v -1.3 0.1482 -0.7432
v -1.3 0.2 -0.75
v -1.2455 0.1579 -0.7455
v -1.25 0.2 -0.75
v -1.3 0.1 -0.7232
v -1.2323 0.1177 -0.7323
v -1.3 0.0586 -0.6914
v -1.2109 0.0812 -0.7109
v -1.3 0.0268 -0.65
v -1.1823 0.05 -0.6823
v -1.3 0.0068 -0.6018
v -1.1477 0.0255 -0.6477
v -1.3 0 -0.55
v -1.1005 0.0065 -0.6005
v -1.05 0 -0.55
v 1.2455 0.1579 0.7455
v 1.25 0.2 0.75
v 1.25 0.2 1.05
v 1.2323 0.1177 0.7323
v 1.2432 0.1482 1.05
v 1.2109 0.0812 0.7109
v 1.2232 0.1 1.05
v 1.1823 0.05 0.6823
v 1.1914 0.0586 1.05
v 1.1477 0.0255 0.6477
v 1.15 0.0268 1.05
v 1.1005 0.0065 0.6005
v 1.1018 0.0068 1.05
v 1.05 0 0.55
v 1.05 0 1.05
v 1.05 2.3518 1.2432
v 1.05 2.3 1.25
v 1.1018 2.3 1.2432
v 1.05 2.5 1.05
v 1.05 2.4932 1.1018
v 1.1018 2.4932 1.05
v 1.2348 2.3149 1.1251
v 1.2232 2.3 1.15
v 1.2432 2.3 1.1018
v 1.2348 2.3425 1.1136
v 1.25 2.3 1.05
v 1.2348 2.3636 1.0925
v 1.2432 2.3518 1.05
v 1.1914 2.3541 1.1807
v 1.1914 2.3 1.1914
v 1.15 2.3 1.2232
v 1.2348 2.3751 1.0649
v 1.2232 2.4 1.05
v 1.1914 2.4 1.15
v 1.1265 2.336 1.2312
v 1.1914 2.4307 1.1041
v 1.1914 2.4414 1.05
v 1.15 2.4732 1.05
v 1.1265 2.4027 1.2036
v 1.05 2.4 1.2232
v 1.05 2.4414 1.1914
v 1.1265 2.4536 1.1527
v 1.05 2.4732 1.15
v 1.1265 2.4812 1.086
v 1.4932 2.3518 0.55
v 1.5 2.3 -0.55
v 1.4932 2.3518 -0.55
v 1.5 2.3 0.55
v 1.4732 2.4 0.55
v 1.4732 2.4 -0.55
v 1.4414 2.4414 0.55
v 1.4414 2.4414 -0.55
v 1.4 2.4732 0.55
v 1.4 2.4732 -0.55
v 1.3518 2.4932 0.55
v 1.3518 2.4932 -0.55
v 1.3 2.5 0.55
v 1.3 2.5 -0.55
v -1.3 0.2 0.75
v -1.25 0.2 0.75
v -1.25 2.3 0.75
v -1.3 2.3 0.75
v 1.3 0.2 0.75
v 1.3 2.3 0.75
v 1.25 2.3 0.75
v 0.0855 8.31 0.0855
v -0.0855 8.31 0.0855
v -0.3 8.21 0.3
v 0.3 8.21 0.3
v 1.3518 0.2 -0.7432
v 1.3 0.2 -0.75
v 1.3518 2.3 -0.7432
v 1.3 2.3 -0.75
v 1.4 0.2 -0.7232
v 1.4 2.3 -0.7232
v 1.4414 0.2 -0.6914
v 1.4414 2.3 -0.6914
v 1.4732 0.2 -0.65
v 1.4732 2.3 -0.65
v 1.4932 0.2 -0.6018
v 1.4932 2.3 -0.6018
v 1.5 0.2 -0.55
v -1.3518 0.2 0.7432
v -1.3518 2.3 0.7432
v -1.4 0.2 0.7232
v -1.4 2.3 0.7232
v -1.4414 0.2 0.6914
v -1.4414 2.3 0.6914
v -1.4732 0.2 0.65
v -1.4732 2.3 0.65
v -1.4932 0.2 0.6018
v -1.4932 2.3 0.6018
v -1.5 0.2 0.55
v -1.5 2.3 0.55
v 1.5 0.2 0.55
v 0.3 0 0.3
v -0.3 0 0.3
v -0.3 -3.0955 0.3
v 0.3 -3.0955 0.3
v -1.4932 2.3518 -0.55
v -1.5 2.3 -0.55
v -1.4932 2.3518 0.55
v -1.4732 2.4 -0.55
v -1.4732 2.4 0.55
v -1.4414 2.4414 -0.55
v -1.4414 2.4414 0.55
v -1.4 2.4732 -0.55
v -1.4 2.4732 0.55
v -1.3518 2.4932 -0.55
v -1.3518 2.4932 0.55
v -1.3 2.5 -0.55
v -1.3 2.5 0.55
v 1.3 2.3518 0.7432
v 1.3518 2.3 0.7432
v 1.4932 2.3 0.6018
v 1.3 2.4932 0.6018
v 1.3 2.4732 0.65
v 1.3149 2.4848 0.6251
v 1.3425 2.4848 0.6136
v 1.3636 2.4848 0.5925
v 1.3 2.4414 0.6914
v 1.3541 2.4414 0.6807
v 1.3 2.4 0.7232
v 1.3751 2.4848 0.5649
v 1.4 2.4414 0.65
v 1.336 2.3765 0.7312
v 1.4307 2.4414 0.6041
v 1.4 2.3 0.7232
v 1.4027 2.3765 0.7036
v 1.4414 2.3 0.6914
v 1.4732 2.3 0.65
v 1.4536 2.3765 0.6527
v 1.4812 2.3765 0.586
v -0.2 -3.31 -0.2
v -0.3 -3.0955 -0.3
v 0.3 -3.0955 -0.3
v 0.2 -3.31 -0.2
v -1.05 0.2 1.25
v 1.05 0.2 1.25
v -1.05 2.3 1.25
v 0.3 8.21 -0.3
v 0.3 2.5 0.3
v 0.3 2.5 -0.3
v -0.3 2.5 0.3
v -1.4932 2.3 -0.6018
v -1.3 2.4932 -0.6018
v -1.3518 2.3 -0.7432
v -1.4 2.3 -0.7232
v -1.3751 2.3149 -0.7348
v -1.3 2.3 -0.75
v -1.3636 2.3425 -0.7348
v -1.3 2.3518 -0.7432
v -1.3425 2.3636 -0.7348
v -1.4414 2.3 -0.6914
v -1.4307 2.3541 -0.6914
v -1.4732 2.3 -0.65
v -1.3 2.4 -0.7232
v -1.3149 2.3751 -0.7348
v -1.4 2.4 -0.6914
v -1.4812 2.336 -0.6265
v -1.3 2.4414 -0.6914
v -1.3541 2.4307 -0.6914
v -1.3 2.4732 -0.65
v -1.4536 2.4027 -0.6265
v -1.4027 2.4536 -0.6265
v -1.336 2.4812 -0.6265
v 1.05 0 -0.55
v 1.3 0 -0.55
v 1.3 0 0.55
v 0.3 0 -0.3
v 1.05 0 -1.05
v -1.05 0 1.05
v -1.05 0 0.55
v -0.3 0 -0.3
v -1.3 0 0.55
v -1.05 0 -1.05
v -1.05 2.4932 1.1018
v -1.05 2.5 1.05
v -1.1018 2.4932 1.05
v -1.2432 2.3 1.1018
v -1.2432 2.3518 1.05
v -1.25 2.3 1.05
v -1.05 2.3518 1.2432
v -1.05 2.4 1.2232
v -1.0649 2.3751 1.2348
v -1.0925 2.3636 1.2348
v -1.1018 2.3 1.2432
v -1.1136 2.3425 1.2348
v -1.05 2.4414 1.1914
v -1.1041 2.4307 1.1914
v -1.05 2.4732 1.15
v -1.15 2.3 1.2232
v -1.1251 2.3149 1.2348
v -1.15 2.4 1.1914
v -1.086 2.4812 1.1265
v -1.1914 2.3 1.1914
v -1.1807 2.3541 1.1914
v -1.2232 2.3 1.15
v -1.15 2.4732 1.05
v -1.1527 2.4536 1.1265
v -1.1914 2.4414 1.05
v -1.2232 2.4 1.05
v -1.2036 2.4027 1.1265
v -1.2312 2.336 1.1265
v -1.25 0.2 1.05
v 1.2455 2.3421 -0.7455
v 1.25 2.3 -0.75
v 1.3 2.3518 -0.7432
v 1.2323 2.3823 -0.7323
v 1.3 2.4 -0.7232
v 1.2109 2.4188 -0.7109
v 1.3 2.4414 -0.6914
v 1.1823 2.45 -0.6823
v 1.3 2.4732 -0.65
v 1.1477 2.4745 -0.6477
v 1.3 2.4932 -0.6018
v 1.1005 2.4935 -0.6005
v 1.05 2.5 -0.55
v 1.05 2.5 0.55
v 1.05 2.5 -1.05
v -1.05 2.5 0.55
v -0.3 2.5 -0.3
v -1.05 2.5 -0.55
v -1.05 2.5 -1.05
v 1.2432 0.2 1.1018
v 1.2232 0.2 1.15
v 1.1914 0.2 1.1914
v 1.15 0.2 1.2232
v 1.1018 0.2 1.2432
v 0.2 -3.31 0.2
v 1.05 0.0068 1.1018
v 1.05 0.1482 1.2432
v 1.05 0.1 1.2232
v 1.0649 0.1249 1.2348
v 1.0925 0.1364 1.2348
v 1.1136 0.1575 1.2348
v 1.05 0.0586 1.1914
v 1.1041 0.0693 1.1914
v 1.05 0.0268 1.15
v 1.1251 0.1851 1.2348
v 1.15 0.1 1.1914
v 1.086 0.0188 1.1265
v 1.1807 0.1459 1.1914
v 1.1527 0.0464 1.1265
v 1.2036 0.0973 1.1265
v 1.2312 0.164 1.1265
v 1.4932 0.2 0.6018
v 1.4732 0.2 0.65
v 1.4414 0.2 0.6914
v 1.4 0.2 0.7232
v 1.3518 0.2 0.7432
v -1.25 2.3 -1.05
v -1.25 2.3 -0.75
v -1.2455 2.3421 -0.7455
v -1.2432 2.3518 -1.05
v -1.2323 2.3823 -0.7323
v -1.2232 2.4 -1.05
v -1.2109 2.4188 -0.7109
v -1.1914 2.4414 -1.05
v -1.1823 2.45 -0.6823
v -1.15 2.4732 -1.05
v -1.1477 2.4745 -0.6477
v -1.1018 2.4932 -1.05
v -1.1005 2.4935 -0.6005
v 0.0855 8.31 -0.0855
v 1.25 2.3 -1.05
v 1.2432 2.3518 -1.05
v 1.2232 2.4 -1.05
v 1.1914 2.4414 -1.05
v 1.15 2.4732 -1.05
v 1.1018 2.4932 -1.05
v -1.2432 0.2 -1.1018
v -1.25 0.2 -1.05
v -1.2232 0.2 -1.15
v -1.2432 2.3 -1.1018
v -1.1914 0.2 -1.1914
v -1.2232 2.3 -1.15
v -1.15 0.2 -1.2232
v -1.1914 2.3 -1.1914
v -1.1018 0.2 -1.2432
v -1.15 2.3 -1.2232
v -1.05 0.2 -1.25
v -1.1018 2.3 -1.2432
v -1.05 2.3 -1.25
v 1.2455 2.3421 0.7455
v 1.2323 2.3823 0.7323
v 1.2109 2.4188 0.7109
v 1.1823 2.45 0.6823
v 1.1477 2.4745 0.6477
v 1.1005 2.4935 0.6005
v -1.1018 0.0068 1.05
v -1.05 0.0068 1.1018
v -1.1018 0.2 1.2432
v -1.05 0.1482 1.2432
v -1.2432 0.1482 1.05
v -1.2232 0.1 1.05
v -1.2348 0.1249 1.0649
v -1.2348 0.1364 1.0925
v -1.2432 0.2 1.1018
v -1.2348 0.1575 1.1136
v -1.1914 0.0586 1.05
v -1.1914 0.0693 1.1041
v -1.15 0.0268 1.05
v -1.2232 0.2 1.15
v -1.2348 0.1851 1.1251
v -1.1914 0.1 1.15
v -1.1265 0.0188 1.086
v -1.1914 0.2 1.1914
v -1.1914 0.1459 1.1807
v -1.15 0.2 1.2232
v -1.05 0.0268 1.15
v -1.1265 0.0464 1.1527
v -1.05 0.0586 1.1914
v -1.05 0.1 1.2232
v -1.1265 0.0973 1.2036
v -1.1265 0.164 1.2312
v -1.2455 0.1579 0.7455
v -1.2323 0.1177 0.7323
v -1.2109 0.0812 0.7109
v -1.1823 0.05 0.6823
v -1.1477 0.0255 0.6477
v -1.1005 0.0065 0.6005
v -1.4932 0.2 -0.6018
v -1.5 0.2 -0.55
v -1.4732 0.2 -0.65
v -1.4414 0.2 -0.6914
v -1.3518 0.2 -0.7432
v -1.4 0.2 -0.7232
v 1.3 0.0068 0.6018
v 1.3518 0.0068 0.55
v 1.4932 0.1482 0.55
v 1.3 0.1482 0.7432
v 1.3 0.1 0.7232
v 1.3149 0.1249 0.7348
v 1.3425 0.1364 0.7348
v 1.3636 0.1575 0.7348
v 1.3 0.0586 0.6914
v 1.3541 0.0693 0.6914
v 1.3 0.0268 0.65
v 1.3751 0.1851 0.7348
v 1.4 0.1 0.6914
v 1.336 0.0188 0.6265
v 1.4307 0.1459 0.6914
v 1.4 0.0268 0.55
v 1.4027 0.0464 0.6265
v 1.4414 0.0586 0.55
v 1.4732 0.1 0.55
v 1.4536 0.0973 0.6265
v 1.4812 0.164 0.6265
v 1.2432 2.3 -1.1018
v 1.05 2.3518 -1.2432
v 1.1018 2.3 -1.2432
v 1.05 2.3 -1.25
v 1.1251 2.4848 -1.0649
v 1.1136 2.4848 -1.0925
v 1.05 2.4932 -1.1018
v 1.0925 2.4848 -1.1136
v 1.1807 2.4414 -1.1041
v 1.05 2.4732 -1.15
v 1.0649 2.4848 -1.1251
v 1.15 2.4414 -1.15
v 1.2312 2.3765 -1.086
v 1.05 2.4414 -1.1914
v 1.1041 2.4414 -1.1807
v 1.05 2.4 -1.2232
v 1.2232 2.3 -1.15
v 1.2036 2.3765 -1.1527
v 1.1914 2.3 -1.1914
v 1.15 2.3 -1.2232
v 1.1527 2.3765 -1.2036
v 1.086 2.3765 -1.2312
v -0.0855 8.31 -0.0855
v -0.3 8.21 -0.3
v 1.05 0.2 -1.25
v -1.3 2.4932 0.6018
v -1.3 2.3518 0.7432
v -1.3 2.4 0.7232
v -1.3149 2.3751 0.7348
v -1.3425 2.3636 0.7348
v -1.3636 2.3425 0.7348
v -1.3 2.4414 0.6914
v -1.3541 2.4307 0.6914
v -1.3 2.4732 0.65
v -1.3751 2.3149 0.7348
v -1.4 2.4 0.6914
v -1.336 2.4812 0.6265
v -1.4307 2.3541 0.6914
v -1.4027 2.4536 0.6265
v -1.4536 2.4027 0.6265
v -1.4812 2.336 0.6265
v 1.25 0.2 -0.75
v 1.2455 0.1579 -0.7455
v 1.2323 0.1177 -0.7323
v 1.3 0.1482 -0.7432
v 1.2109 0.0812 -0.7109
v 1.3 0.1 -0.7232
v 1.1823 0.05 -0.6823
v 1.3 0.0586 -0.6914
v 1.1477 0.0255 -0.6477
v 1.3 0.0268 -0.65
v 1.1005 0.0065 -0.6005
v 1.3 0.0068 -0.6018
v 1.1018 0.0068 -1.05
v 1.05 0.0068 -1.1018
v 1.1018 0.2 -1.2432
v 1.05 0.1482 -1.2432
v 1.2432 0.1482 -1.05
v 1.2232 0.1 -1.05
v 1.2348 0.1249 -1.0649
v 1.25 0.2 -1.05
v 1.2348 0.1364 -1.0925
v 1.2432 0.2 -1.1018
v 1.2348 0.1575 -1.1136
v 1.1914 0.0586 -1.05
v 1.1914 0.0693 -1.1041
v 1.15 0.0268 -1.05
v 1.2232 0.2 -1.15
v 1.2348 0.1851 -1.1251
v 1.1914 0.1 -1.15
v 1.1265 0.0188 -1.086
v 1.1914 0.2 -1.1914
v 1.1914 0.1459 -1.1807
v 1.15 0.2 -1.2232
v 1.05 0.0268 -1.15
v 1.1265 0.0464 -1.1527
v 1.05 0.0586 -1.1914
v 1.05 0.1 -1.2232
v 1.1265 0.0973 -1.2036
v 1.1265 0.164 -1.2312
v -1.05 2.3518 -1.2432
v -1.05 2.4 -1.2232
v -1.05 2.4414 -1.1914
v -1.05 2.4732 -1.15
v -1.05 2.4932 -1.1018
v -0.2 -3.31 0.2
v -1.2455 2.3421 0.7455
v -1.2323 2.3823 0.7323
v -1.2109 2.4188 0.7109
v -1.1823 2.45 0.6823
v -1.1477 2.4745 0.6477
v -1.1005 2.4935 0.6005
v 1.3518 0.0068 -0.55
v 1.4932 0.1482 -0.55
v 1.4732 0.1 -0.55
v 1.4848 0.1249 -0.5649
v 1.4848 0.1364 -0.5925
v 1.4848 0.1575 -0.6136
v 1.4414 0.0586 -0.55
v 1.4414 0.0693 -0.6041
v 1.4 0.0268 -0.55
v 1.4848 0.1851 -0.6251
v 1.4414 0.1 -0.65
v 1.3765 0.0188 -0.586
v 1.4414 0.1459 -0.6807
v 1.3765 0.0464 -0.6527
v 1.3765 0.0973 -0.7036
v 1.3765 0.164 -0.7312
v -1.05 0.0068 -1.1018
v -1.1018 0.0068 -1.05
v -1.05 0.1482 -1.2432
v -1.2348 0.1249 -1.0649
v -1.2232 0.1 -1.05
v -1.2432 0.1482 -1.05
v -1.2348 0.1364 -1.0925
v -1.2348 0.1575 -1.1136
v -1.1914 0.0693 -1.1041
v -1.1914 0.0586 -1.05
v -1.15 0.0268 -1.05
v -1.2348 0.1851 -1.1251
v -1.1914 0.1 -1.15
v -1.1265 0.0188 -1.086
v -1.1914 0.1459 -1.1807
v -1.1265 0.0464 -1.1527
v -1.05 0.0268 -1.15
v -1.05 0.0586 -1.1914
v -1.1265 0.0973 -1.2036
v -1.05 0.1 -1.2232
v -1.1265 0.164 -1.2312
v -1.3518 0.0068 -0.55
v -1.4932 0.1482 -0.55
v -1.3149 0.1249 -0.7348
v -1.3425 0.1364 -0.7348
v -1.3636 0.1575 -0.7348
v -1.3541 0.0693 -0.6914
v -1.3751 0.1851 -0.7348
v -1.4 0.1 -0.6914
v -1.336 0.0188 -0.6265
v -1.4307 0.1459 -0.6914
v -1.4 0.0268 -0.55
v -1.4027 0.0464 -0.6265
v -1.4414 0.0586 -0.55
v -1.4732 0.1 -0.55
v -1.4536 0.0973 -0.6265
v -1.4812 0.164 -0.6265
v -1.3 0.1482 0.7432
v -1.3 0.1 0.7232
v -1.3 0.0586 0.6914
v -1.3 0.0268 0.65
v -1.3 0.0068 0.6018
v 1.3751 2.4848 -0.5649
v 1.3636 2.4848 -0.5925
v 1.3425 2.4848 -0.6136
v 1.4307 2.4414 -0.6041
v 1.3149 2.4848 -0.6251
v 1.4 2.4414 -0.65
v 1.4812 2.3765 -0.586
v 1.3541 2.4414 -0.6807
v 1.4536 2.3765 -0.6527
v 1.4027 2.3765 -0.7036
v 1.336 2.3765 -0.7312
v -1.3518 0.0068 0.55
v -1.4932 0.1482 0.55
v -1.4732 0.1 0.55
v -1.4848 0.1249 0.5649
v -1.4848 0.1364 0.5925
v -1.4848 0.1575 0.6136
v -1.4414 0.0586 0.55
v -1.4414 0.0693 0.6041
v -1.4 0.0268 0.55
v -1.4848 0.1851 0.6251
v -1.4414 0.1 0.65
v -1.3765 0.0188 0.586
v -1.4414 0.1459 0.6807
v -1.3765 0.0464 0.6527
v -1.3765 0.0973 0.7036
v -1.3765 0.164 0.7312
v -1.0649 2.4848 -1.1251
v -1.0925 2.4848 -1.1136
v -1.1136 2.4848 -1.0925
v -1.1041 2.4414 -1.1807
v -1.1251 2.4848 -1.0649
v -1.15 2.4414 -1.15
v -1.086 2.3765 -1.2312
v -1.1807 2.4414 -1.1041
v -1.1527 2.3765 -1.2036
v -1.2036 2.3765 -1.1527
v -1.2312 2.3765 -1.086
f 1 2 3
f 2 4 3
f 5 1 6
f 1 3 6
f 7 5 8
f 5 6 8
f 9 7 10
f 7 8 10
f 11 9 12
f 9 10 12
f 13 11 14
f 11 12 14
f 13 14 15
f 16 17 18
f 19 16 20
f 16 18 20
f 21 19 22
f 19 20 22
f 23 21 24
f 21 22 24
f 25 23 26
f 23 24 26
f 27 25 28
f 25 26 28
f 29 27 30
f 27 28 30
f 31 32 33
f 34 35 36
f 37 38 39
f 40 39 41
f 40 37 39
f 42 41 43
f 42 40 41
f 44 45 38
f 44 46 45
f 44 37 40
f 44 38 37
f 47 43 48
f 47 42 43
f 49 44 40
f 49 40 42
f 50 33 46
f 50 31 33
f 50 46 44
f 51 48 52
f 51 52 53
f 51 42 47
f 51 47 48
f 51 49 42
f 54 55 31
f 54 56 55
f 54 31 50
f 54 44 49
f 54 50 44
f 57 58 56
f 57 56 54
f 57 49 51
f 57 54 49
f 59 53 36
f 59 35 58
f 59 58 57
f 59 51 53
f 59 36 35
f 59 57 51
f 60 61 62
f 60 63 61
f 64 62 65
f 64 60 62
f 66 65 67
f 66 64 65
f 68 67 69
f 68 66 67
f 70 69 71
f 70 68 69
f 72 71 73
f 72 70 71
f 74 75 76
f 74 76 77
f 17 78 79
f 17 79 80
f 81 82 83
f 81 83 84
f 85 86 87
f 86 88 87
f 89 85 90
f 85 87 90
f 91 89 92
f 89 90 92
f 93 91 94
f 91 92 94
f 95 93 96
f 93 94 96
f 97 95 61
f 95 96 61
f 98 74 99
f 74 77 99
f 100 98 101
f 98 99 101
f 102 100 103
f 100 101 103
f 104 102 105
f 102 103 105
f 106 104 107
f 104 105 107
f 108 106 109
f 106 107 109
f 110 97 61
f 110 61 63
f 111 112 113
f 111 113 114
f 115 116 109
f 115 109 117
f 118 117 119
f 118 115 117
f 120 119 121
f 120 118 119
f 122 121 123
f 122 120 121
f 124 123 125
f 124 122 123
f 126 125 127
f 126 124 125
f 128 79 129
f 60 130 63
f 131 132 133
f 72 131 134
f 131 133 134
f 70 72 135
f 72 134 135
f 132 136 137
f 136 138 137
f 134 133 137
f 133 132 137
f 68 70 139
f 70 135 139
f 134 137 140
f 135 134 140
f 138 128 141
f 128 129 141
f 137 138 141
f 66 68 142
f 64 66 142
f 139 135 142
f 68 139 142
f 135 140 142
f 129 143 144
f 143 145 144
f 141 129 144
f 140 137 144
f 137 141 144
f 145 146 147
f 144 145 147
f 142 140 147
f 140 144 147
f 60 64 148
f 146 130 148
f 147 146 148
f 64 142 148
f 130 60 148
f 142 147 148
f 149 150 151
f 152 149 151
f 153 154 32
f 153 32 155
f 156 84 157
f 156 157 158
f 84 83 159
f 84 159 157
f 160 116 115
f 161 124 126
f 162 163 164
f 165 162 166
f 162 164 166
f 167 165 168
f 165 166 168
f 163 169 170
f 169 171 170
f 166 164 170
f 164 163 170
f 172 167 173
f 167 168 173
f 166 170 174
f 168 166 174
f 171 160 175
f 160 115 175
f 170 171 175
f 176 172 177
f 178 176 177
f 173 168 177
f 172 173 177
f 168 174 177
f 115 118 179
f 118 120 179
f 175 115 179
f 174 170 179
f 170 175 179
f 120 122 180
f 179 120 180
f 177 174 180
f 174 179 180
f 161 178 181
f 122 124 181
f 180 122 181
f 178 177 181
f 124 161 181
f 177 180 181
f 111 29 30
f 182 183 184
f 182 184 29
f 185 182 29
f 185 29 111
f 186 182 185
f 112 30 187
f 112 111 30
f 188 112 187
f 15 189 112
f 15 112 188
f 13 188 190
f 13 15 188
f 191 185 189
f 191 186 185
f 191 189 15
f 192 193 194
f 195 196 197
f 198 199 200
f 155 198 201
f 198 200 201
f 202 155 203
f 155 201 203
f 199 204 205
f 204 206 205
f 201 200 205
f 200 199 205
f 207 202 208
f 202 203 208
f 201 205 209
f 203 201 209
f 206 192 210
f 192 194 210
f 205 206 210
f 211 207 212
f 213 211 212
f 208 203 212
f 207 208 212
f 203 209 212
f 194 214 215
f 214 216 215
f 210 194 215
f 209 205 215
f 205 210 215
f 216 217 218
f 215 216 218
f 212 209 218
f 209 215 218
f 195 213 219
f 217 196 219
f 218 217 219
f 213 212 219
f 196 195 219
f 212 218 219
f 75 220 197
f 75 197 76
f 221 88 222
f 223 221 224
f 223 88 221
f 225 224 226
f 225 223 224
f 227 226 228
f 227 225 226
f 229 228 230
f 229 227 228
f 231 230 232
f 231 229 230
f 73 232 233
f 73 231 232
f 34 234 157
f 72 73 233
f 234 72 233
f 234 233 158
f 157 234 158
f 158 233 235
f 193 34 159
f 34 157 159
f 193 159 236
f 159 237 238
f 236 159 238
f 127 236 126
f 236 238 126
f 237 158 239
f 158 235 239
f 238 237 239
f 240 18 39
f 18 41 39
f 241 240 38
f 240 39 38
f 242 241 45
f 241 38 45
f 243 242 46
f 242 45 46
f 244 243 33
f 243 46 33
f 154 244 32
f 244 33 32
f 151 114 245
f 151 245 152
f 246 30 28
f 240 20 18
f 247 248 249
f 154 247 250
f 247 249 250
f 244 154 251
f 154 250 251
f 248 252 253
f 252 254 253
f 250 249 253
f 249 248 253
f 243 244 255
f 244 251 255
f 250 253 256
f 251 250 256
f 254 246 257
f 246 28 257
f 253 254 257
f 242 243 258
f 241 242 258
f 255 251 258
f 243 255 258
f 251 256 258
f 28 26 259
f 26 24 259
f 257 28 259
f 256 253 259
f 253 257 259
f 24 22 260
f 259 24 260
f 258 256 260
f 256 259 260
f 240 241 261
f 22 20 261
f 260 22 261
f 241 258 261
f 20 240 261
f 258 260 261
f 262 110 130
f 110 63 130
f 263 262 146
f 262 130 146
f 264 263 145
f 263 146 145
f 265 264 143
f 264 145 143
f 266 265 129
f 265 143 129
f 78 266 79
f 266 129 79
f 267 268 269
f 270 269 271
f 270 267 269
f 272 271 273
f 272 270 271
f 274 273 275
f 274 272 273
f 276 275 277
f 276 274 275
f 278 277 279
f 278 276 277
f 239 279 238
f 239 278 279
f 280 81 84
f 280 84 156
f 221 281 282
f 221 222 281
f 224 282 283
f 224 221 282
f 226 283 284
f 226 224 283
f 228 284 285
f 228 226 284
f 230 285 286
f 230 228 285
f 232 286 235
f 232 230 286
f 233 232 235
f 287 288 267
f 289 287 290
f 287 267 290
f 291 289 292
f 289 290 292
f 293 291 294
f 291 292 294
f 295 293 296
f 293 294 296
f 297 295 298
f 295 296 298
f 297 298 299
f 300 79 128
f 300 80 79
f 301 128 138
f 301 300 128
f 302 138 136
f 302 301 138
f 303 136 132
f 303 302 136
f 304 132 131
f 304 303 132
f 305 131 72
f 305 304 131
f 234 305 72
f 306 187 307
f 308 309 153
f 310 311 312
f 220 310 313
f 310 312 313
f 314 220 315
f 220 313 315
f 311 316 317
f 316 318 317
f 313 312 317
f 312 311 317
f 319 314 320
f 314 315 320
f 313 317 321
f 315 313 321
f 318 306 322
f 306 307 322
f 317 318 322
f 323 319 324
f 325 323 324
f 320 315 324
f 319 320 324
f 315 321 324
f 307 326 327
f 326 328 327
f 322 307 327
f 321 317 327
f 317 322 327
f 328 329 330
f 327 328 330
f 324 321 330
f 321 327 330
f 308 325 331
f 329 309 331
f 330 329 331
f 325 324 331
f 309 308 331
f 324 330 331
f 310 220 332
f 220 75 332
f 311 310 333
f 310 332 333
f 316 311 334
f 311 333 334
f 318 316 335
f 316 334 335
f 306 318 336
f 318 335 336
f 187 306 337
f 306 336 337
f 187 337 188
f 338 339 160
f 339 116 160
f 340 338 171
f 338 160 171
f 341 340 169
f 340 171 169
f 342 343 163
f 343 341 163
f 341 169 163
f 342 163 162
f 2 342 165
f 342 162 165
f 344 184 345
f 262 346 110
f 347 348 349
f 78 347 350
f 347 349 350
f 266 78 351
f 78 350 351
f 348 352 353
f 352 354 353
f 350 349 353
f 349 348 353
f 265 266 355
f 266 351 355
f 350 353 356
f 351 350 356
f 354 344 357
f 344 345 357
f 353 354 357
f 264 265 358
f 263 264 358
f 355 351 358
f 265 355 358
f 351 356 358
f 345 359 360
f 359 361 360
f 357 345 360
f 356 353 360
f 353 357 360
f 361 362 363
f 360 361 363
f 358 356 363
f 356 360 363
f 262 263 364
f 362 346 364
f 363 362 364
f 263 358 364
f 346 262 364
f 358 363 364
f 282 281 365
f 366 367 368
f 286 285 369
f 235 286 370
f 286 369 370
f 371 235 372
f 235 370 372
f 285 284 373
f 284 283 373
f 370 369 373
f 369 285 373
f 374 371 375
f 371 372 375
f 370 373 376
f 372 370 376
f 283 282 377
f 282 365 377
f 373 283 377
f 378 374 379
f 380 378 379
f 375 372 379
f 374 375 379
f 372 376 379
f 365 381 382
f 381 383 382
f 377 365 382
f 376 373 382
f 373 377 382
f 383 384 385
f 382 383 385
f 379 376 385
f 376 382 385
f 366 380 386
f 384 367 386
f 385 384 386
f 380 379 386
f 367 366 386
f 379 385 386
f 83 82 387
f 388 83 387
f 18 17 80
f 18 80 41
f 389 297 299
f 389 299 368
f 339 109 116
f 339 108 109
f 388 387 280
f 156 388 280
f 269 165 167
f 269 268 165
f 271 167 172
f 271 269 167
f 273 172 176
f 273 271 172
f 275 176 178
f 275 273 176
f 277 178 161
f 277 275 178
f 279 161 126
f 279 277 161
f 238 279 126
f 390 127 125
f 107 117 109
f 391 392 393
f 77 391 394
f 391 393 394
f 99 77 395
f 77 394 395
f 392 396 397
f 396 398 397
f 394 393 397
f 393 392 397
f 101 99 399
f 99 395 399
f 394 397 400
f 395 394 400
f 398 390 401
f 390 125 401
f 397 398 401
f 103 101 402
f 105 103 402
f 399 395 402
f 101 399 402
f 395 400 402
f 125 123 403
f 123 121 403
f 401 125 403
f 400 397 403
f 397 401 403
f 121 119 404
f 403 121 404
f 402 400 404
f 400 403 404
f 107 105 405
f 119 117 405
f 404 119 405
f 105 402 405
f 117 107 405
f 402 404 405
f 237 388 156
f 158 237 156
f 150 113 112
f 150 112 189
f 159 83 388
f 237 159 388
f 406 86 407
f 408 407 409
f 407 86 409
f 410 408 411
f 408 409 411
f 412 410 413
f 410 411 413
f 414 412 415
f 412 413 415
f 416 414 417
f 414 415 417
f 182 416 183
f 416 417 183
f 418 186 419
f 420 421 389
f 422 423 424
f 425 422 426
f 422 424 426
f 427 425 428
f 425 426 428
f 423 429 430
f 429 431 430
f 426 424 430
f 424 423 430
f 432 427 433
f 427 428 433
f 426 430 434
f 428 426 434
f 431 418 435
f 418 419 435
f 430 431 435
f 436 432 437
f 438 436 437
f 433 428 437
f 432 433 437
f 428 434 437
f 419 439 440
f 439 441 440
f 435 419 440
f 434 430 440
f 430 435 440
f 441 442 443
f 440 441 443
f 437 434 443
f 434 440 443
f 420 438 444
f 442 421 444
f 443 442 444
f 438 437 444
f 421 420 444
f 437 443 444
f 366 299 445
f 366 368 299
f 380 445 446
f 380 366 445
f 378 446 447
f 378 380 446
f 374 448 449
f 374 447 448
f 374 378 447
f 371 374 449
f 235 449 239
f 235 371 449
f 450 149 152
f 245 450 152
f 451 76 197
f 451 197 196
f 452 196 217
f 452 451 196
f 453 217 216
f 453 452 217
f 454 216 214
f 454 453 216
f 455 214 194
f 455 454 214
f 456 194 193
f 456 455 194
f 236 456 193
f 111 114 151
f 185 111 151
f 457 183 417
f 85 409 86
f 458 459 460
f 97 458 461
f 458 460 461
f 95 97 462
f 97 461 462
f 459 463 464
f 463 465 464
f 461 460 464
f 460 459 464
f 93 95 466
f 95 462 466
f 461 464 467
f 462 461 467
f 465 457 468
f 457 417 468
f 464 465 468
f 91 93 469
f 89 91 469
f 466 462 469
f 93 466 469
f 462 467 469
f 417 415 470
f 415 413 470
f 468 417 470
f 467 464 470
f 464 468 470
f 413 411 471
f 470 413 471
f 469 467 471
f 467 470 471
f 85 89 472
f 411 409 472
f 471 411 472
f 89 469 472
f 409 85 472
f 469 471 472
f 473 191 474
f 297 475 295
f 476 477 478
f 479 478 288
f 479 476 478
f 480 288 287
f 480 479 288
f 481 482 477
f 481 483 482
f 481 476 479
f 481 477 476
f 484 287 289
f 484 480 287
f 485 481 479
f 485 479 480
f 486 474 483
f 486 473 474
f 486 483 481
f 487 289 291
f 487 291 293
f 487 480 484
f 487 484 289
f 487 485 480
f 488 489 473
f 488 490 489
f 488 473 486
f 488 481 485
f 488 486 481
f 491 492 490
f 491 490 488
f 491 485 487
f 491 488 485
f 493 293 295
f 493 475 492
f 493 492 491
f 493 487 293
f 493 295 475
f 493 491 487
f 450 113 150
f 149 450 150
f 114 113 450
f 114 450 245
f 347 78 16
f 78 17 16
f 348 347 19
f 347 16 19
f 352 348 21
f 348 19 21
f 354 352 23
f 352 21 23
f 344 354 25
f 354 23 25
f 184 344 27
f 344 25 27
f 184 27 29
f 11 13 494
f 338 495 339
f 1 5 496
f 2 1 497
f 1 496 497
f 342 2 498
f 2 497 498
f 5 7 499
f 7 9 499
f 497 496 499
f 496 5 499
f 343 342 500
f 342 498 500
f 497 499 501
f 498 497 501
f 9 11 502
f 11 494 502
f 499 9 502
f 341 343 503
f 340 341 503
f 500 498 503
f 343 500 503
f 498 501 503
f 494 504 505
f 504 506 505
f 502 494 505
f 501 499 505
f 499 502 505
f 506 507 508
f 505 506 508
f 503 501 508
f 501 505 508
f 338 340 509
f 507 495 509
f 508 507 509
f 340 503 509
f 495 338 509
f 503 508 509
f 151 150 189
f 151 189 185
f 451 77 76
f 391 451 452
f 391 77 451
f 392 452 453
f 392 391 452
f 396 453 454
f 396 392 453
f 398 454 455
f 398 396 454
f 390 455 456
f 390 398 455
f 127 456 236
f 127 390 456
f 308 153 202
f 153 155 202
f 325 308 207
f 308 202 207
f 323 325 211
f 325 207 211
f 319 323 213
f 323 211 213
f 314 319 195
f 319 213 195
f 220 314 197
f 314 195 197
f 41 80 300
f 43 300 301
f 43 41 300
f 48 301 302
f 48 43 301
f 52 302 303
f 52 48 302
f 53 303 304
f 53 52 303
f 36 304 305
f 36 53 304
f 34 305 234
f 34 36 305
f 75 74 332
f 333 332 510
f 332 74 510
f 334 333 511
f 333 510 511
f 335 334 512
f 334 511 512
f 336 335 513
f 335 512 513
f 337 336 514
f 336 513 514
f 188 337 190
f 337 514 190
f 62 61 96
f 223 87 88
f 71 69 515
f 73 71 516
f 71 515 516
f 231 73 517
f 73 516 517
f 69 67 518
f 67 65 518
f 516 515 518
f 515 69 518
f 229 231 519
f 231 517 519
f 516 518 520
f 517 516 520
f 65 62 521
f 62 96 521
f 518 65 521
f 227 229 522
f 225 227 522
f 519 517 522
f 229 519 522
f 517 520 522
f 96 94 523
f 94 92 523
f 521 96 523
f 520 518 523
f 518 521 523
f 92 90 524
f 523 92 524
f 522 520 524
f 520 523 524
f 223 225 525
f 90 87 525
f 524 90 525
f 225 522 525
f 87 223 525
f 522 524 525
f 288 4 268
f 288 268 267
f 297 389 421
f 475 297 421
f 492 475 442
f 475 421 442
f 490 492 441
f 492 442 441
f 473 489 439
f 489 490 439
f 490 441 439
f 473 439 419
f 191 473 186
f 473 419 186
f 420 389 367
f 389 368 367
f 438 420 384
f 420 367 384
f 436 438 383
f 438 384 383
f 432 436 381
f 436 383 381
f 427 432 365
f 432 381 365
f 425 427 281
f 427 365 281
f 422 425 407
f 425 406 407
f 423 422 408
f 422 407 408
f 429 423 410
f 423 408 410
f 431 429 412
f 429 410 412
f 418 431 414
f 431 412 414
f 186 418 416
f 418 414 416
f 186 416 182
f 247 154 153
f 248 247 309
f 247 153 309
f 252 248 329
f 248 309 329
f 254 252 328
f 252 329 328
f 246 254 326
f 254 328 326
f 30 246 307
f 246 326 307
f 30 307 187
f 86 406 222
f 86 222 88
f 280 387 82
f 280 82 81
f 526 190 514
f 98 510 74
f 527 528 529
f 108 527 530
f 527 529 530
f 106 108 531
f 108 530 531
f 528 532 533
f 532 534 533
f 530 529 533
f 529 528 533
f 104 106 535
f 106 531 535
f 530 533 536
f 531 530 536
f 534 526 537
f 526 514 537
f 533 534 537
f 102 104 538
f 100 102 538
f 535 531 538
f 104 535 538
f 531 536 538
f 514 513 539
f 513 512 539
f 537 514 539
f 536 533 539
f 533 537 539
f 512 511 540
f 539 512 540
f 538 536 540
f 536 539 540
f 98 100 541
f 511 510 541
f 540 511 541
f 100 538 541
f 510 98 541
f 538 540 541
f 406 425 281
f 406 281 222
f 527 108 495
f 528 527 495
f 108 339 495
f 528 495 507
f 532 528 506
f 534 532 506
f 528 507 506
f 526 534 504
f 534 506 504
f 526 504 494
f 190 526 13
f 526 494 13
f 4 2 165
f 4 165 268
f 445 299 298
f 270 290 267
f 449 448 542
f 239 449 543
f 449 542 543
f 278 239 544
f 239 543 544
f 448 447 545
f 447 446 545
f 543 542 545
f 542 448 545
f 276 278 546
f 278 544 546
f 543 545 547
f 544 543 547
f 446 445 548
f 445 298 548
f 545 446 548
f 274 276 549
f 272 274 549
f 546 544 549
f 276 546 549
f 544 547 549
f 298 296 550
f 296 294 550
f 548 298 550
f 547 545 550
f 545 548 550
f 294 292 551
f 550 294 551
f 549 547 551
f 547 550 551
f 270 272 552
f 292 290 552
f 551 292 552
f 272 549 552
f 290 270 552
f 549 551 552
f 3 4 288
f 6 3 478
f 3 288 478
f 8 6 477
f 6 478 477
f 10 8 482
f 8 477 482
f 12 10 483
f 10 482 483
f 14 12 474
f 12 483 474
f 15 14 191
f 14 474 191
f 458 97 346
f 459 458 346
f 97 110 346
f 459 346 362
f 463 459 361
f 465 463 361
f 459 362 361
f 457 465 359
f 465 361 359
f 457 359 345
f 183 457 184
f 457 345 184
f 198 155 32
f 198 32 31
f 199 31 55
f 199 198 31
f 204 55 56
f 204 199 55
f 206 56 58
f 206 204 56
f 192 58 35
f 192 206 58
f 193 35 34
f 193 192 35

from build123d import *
from OCP.BRepFilletAPI import BRepFilletAPI_MakeChamfer

# Parameters (mm, degrees)
BOSS_EXTRUDE1_DEPTH = 2.5
FILLET1_R           = 0.2
SKETCH2_W           = 0.6
SKETCH2_H           = 0.6
BOSS_EXTRUDE2_DEPTH = 5.81
CHAMFER1_SIZE       = 0.1
CHAMFER1_SIZE2      = 0.214450692


with BuildPart() as part:
    # Sketch1 → Boss-Extrude1 (new body)
    with BuildSketch(Plane(origin=(0, 0, 0), x_dir=(1, 0, 0), z_dir=(0, 1, 0))):
        Polygon((1.25, 0.75), (1.5, 0.75), (1.5, -0.75), (1.25, -0.75), (1.25, -1.25), (-1.25, -1.25), (-1.25, -0.75), (-1.5, -0.75), (-1.5, 0.75), (-1.25, 0.75), (-1.25, 1.25), (1.25, 1.25), align=None)
    extrude(amount=BOSS_EXTRUDE1_DEPTH)

    # Fillet1
    fillet1_edges = [part.edges().sort_by_distance(p)[0] for p in [
        (-1.5, 2.5, 0),
        (0, 0, -1.25),
        (1.25, 0, -1),
        (1.375, 0, -0.75),
        (1.5, 0, 0),
        (1.375, 0, 0.75),
        (1.25, 0, 1),
        (-1.375, 2.5, 0.75),
        (0, 0, 1.25),
        (-1.25, 0, 1),
        (-1.375, 0, 0.75),
        (-1.5, 0, 0),
        (-1.375, 0, -0.75),
        (-1.25, 0, -1),
        (-1.25, 2.5, 1),
        (0, 2.5, 1.25),
        (-1.25, 1.25, -1.25),
        (1.25, 1.25, -1.25),
        (1.5, 1.25, -0.75),
        (1.5, 1.25, 0.75),
        (1.25, 1.25, 1.25),
        (-1.25, 1.25, 1.25),
        (-1.5, 1.25, 0.75),
        (-1.5, 1.25, -0.75),
        (1.25, 2.5, 1),
        (1.375, 2.5, 0.75),
        (1.5, 2.5, 0),
        (1.375, 2.5, -0.75),
        (1.25, 2.5, -1),
        (0, 2.5, -1.25),
        (-1.25, 2.5, -1),
        (-1.375, 2.5, -0.75),
    ]]
    fillet(fillet1_edges, radius=FILLET1_R)

    # Sketch2 → Boss-Extrude2 (add, symmetric)
    with BuildSketch(Plane(origin=(0, 2.5, 0), x_dir=(1, 0, 0), z_dir=(0, 1, 0))):
        Rectangle(SKETCH2_W, SKETCH2_H)
    extrude(amount=BOSS_EXTRUDE2_DEPTH, both=True)

    # Chamfer1: one chamfer whose edges measure the first distance from different faces: ONE call of the kernel's chamfer builder (chamfer() names one face for all edges)
    chamfer1_edges_1 = [part.edges().sort_by_distance(p)[0] for p in [
        (-0.3, -3.31, 0),
        (0, -3.31, 0.3),
        (0.3, -3.31, 0),
        (0, -3.31, -0.3),
    ]]
    chamfer1_side_1 = [part.faces().sort_by_distance(p)[0] for p in [
        (0, -3.31, 0),
    ]]
    chamfer1_edges_2 = [part.edges().sort_by_distance(p)[0] for p in [
        (-0.3, 8.31, 0),
    ]]
    chamfer1_side_2 = [part.faces().sort_by_distance(p)[0] for p in [
        (-0.3, 5.405, 0),
    ]]
    chamfer1_edges_3 = [part.edges().sort_by_distance(p)[0] for p in [
        (0, 8.31, 0.3),
    ]]
    chamfer1_side_3 = [part.faces().sort_by_distance(p)[0] for p in [
        (0, 5.405, 0.3),
    ]]
    chamfer1_edges_4 = [part.edges().sort_by_distance(p)[0] for p in [
        (0.3, 8.31, 0),
    ]]
    chamfer1_side_4 = [part.faces().sort_by_distance(p)[0] for p in [
        (0.3, 5.405, 0),
    ]]
    chamfer1_edges_5 = [part.edges().sort_by_distance(p)[0] for p in [
        (0, 8.31, -0.3),
    ]]
    chamfer1_side_5 = [part.faces().sort_by_distance(p)[0] for p in [
        (0, 5.405, -0.3),
    ]]
    chamfer1 = BRepFilletAPI_MakeChamfer(part.part.solid().wrapped)
    for e in chamfer1_edges_1:
        chamfer1.Add(CHAMFER1_SIZE, CHAMFER1_SIZE2, e.wrapped, chamfer1_side_1[0].wrapped)  # the first distance lies on this face
    for e in chamfer1_edges_2:
        chamfer1.Add(CHAMFER1_SIZE, CHAMFER1_SIZE2, e.wrapped, chamfer1_side_2[0].wrapped)  # the first distance lies on this face
    for e in chamfer1_edges_3:
        chamfer1.Add(CHAMFER1_SIZE, CHAMFER1_SIZE2, e.wrapped, chamfer1_side_3[0].wrapped)  # the first distance lies on this face
    for e in chamfer1_edges_4:
        chamfer1.Add(CHAMFER1_SIZE, CHAMFER1_SIZE2, e.wrapped, chamfer1_side_4[0].wrapped)  # the first distance lies on this face
    for e in chamfer1_edges_5:
        chamfer1.Add(CHAMFER1_SIZE, CHAMFER1_SIZE2, e.wrapped, chamfer1_side_5[0].wrapped)  # the first distance lies on this face
    add(Compound.cast(chamfer1.Shape()), mode=Mode.REPLACE)


solid = part.part
